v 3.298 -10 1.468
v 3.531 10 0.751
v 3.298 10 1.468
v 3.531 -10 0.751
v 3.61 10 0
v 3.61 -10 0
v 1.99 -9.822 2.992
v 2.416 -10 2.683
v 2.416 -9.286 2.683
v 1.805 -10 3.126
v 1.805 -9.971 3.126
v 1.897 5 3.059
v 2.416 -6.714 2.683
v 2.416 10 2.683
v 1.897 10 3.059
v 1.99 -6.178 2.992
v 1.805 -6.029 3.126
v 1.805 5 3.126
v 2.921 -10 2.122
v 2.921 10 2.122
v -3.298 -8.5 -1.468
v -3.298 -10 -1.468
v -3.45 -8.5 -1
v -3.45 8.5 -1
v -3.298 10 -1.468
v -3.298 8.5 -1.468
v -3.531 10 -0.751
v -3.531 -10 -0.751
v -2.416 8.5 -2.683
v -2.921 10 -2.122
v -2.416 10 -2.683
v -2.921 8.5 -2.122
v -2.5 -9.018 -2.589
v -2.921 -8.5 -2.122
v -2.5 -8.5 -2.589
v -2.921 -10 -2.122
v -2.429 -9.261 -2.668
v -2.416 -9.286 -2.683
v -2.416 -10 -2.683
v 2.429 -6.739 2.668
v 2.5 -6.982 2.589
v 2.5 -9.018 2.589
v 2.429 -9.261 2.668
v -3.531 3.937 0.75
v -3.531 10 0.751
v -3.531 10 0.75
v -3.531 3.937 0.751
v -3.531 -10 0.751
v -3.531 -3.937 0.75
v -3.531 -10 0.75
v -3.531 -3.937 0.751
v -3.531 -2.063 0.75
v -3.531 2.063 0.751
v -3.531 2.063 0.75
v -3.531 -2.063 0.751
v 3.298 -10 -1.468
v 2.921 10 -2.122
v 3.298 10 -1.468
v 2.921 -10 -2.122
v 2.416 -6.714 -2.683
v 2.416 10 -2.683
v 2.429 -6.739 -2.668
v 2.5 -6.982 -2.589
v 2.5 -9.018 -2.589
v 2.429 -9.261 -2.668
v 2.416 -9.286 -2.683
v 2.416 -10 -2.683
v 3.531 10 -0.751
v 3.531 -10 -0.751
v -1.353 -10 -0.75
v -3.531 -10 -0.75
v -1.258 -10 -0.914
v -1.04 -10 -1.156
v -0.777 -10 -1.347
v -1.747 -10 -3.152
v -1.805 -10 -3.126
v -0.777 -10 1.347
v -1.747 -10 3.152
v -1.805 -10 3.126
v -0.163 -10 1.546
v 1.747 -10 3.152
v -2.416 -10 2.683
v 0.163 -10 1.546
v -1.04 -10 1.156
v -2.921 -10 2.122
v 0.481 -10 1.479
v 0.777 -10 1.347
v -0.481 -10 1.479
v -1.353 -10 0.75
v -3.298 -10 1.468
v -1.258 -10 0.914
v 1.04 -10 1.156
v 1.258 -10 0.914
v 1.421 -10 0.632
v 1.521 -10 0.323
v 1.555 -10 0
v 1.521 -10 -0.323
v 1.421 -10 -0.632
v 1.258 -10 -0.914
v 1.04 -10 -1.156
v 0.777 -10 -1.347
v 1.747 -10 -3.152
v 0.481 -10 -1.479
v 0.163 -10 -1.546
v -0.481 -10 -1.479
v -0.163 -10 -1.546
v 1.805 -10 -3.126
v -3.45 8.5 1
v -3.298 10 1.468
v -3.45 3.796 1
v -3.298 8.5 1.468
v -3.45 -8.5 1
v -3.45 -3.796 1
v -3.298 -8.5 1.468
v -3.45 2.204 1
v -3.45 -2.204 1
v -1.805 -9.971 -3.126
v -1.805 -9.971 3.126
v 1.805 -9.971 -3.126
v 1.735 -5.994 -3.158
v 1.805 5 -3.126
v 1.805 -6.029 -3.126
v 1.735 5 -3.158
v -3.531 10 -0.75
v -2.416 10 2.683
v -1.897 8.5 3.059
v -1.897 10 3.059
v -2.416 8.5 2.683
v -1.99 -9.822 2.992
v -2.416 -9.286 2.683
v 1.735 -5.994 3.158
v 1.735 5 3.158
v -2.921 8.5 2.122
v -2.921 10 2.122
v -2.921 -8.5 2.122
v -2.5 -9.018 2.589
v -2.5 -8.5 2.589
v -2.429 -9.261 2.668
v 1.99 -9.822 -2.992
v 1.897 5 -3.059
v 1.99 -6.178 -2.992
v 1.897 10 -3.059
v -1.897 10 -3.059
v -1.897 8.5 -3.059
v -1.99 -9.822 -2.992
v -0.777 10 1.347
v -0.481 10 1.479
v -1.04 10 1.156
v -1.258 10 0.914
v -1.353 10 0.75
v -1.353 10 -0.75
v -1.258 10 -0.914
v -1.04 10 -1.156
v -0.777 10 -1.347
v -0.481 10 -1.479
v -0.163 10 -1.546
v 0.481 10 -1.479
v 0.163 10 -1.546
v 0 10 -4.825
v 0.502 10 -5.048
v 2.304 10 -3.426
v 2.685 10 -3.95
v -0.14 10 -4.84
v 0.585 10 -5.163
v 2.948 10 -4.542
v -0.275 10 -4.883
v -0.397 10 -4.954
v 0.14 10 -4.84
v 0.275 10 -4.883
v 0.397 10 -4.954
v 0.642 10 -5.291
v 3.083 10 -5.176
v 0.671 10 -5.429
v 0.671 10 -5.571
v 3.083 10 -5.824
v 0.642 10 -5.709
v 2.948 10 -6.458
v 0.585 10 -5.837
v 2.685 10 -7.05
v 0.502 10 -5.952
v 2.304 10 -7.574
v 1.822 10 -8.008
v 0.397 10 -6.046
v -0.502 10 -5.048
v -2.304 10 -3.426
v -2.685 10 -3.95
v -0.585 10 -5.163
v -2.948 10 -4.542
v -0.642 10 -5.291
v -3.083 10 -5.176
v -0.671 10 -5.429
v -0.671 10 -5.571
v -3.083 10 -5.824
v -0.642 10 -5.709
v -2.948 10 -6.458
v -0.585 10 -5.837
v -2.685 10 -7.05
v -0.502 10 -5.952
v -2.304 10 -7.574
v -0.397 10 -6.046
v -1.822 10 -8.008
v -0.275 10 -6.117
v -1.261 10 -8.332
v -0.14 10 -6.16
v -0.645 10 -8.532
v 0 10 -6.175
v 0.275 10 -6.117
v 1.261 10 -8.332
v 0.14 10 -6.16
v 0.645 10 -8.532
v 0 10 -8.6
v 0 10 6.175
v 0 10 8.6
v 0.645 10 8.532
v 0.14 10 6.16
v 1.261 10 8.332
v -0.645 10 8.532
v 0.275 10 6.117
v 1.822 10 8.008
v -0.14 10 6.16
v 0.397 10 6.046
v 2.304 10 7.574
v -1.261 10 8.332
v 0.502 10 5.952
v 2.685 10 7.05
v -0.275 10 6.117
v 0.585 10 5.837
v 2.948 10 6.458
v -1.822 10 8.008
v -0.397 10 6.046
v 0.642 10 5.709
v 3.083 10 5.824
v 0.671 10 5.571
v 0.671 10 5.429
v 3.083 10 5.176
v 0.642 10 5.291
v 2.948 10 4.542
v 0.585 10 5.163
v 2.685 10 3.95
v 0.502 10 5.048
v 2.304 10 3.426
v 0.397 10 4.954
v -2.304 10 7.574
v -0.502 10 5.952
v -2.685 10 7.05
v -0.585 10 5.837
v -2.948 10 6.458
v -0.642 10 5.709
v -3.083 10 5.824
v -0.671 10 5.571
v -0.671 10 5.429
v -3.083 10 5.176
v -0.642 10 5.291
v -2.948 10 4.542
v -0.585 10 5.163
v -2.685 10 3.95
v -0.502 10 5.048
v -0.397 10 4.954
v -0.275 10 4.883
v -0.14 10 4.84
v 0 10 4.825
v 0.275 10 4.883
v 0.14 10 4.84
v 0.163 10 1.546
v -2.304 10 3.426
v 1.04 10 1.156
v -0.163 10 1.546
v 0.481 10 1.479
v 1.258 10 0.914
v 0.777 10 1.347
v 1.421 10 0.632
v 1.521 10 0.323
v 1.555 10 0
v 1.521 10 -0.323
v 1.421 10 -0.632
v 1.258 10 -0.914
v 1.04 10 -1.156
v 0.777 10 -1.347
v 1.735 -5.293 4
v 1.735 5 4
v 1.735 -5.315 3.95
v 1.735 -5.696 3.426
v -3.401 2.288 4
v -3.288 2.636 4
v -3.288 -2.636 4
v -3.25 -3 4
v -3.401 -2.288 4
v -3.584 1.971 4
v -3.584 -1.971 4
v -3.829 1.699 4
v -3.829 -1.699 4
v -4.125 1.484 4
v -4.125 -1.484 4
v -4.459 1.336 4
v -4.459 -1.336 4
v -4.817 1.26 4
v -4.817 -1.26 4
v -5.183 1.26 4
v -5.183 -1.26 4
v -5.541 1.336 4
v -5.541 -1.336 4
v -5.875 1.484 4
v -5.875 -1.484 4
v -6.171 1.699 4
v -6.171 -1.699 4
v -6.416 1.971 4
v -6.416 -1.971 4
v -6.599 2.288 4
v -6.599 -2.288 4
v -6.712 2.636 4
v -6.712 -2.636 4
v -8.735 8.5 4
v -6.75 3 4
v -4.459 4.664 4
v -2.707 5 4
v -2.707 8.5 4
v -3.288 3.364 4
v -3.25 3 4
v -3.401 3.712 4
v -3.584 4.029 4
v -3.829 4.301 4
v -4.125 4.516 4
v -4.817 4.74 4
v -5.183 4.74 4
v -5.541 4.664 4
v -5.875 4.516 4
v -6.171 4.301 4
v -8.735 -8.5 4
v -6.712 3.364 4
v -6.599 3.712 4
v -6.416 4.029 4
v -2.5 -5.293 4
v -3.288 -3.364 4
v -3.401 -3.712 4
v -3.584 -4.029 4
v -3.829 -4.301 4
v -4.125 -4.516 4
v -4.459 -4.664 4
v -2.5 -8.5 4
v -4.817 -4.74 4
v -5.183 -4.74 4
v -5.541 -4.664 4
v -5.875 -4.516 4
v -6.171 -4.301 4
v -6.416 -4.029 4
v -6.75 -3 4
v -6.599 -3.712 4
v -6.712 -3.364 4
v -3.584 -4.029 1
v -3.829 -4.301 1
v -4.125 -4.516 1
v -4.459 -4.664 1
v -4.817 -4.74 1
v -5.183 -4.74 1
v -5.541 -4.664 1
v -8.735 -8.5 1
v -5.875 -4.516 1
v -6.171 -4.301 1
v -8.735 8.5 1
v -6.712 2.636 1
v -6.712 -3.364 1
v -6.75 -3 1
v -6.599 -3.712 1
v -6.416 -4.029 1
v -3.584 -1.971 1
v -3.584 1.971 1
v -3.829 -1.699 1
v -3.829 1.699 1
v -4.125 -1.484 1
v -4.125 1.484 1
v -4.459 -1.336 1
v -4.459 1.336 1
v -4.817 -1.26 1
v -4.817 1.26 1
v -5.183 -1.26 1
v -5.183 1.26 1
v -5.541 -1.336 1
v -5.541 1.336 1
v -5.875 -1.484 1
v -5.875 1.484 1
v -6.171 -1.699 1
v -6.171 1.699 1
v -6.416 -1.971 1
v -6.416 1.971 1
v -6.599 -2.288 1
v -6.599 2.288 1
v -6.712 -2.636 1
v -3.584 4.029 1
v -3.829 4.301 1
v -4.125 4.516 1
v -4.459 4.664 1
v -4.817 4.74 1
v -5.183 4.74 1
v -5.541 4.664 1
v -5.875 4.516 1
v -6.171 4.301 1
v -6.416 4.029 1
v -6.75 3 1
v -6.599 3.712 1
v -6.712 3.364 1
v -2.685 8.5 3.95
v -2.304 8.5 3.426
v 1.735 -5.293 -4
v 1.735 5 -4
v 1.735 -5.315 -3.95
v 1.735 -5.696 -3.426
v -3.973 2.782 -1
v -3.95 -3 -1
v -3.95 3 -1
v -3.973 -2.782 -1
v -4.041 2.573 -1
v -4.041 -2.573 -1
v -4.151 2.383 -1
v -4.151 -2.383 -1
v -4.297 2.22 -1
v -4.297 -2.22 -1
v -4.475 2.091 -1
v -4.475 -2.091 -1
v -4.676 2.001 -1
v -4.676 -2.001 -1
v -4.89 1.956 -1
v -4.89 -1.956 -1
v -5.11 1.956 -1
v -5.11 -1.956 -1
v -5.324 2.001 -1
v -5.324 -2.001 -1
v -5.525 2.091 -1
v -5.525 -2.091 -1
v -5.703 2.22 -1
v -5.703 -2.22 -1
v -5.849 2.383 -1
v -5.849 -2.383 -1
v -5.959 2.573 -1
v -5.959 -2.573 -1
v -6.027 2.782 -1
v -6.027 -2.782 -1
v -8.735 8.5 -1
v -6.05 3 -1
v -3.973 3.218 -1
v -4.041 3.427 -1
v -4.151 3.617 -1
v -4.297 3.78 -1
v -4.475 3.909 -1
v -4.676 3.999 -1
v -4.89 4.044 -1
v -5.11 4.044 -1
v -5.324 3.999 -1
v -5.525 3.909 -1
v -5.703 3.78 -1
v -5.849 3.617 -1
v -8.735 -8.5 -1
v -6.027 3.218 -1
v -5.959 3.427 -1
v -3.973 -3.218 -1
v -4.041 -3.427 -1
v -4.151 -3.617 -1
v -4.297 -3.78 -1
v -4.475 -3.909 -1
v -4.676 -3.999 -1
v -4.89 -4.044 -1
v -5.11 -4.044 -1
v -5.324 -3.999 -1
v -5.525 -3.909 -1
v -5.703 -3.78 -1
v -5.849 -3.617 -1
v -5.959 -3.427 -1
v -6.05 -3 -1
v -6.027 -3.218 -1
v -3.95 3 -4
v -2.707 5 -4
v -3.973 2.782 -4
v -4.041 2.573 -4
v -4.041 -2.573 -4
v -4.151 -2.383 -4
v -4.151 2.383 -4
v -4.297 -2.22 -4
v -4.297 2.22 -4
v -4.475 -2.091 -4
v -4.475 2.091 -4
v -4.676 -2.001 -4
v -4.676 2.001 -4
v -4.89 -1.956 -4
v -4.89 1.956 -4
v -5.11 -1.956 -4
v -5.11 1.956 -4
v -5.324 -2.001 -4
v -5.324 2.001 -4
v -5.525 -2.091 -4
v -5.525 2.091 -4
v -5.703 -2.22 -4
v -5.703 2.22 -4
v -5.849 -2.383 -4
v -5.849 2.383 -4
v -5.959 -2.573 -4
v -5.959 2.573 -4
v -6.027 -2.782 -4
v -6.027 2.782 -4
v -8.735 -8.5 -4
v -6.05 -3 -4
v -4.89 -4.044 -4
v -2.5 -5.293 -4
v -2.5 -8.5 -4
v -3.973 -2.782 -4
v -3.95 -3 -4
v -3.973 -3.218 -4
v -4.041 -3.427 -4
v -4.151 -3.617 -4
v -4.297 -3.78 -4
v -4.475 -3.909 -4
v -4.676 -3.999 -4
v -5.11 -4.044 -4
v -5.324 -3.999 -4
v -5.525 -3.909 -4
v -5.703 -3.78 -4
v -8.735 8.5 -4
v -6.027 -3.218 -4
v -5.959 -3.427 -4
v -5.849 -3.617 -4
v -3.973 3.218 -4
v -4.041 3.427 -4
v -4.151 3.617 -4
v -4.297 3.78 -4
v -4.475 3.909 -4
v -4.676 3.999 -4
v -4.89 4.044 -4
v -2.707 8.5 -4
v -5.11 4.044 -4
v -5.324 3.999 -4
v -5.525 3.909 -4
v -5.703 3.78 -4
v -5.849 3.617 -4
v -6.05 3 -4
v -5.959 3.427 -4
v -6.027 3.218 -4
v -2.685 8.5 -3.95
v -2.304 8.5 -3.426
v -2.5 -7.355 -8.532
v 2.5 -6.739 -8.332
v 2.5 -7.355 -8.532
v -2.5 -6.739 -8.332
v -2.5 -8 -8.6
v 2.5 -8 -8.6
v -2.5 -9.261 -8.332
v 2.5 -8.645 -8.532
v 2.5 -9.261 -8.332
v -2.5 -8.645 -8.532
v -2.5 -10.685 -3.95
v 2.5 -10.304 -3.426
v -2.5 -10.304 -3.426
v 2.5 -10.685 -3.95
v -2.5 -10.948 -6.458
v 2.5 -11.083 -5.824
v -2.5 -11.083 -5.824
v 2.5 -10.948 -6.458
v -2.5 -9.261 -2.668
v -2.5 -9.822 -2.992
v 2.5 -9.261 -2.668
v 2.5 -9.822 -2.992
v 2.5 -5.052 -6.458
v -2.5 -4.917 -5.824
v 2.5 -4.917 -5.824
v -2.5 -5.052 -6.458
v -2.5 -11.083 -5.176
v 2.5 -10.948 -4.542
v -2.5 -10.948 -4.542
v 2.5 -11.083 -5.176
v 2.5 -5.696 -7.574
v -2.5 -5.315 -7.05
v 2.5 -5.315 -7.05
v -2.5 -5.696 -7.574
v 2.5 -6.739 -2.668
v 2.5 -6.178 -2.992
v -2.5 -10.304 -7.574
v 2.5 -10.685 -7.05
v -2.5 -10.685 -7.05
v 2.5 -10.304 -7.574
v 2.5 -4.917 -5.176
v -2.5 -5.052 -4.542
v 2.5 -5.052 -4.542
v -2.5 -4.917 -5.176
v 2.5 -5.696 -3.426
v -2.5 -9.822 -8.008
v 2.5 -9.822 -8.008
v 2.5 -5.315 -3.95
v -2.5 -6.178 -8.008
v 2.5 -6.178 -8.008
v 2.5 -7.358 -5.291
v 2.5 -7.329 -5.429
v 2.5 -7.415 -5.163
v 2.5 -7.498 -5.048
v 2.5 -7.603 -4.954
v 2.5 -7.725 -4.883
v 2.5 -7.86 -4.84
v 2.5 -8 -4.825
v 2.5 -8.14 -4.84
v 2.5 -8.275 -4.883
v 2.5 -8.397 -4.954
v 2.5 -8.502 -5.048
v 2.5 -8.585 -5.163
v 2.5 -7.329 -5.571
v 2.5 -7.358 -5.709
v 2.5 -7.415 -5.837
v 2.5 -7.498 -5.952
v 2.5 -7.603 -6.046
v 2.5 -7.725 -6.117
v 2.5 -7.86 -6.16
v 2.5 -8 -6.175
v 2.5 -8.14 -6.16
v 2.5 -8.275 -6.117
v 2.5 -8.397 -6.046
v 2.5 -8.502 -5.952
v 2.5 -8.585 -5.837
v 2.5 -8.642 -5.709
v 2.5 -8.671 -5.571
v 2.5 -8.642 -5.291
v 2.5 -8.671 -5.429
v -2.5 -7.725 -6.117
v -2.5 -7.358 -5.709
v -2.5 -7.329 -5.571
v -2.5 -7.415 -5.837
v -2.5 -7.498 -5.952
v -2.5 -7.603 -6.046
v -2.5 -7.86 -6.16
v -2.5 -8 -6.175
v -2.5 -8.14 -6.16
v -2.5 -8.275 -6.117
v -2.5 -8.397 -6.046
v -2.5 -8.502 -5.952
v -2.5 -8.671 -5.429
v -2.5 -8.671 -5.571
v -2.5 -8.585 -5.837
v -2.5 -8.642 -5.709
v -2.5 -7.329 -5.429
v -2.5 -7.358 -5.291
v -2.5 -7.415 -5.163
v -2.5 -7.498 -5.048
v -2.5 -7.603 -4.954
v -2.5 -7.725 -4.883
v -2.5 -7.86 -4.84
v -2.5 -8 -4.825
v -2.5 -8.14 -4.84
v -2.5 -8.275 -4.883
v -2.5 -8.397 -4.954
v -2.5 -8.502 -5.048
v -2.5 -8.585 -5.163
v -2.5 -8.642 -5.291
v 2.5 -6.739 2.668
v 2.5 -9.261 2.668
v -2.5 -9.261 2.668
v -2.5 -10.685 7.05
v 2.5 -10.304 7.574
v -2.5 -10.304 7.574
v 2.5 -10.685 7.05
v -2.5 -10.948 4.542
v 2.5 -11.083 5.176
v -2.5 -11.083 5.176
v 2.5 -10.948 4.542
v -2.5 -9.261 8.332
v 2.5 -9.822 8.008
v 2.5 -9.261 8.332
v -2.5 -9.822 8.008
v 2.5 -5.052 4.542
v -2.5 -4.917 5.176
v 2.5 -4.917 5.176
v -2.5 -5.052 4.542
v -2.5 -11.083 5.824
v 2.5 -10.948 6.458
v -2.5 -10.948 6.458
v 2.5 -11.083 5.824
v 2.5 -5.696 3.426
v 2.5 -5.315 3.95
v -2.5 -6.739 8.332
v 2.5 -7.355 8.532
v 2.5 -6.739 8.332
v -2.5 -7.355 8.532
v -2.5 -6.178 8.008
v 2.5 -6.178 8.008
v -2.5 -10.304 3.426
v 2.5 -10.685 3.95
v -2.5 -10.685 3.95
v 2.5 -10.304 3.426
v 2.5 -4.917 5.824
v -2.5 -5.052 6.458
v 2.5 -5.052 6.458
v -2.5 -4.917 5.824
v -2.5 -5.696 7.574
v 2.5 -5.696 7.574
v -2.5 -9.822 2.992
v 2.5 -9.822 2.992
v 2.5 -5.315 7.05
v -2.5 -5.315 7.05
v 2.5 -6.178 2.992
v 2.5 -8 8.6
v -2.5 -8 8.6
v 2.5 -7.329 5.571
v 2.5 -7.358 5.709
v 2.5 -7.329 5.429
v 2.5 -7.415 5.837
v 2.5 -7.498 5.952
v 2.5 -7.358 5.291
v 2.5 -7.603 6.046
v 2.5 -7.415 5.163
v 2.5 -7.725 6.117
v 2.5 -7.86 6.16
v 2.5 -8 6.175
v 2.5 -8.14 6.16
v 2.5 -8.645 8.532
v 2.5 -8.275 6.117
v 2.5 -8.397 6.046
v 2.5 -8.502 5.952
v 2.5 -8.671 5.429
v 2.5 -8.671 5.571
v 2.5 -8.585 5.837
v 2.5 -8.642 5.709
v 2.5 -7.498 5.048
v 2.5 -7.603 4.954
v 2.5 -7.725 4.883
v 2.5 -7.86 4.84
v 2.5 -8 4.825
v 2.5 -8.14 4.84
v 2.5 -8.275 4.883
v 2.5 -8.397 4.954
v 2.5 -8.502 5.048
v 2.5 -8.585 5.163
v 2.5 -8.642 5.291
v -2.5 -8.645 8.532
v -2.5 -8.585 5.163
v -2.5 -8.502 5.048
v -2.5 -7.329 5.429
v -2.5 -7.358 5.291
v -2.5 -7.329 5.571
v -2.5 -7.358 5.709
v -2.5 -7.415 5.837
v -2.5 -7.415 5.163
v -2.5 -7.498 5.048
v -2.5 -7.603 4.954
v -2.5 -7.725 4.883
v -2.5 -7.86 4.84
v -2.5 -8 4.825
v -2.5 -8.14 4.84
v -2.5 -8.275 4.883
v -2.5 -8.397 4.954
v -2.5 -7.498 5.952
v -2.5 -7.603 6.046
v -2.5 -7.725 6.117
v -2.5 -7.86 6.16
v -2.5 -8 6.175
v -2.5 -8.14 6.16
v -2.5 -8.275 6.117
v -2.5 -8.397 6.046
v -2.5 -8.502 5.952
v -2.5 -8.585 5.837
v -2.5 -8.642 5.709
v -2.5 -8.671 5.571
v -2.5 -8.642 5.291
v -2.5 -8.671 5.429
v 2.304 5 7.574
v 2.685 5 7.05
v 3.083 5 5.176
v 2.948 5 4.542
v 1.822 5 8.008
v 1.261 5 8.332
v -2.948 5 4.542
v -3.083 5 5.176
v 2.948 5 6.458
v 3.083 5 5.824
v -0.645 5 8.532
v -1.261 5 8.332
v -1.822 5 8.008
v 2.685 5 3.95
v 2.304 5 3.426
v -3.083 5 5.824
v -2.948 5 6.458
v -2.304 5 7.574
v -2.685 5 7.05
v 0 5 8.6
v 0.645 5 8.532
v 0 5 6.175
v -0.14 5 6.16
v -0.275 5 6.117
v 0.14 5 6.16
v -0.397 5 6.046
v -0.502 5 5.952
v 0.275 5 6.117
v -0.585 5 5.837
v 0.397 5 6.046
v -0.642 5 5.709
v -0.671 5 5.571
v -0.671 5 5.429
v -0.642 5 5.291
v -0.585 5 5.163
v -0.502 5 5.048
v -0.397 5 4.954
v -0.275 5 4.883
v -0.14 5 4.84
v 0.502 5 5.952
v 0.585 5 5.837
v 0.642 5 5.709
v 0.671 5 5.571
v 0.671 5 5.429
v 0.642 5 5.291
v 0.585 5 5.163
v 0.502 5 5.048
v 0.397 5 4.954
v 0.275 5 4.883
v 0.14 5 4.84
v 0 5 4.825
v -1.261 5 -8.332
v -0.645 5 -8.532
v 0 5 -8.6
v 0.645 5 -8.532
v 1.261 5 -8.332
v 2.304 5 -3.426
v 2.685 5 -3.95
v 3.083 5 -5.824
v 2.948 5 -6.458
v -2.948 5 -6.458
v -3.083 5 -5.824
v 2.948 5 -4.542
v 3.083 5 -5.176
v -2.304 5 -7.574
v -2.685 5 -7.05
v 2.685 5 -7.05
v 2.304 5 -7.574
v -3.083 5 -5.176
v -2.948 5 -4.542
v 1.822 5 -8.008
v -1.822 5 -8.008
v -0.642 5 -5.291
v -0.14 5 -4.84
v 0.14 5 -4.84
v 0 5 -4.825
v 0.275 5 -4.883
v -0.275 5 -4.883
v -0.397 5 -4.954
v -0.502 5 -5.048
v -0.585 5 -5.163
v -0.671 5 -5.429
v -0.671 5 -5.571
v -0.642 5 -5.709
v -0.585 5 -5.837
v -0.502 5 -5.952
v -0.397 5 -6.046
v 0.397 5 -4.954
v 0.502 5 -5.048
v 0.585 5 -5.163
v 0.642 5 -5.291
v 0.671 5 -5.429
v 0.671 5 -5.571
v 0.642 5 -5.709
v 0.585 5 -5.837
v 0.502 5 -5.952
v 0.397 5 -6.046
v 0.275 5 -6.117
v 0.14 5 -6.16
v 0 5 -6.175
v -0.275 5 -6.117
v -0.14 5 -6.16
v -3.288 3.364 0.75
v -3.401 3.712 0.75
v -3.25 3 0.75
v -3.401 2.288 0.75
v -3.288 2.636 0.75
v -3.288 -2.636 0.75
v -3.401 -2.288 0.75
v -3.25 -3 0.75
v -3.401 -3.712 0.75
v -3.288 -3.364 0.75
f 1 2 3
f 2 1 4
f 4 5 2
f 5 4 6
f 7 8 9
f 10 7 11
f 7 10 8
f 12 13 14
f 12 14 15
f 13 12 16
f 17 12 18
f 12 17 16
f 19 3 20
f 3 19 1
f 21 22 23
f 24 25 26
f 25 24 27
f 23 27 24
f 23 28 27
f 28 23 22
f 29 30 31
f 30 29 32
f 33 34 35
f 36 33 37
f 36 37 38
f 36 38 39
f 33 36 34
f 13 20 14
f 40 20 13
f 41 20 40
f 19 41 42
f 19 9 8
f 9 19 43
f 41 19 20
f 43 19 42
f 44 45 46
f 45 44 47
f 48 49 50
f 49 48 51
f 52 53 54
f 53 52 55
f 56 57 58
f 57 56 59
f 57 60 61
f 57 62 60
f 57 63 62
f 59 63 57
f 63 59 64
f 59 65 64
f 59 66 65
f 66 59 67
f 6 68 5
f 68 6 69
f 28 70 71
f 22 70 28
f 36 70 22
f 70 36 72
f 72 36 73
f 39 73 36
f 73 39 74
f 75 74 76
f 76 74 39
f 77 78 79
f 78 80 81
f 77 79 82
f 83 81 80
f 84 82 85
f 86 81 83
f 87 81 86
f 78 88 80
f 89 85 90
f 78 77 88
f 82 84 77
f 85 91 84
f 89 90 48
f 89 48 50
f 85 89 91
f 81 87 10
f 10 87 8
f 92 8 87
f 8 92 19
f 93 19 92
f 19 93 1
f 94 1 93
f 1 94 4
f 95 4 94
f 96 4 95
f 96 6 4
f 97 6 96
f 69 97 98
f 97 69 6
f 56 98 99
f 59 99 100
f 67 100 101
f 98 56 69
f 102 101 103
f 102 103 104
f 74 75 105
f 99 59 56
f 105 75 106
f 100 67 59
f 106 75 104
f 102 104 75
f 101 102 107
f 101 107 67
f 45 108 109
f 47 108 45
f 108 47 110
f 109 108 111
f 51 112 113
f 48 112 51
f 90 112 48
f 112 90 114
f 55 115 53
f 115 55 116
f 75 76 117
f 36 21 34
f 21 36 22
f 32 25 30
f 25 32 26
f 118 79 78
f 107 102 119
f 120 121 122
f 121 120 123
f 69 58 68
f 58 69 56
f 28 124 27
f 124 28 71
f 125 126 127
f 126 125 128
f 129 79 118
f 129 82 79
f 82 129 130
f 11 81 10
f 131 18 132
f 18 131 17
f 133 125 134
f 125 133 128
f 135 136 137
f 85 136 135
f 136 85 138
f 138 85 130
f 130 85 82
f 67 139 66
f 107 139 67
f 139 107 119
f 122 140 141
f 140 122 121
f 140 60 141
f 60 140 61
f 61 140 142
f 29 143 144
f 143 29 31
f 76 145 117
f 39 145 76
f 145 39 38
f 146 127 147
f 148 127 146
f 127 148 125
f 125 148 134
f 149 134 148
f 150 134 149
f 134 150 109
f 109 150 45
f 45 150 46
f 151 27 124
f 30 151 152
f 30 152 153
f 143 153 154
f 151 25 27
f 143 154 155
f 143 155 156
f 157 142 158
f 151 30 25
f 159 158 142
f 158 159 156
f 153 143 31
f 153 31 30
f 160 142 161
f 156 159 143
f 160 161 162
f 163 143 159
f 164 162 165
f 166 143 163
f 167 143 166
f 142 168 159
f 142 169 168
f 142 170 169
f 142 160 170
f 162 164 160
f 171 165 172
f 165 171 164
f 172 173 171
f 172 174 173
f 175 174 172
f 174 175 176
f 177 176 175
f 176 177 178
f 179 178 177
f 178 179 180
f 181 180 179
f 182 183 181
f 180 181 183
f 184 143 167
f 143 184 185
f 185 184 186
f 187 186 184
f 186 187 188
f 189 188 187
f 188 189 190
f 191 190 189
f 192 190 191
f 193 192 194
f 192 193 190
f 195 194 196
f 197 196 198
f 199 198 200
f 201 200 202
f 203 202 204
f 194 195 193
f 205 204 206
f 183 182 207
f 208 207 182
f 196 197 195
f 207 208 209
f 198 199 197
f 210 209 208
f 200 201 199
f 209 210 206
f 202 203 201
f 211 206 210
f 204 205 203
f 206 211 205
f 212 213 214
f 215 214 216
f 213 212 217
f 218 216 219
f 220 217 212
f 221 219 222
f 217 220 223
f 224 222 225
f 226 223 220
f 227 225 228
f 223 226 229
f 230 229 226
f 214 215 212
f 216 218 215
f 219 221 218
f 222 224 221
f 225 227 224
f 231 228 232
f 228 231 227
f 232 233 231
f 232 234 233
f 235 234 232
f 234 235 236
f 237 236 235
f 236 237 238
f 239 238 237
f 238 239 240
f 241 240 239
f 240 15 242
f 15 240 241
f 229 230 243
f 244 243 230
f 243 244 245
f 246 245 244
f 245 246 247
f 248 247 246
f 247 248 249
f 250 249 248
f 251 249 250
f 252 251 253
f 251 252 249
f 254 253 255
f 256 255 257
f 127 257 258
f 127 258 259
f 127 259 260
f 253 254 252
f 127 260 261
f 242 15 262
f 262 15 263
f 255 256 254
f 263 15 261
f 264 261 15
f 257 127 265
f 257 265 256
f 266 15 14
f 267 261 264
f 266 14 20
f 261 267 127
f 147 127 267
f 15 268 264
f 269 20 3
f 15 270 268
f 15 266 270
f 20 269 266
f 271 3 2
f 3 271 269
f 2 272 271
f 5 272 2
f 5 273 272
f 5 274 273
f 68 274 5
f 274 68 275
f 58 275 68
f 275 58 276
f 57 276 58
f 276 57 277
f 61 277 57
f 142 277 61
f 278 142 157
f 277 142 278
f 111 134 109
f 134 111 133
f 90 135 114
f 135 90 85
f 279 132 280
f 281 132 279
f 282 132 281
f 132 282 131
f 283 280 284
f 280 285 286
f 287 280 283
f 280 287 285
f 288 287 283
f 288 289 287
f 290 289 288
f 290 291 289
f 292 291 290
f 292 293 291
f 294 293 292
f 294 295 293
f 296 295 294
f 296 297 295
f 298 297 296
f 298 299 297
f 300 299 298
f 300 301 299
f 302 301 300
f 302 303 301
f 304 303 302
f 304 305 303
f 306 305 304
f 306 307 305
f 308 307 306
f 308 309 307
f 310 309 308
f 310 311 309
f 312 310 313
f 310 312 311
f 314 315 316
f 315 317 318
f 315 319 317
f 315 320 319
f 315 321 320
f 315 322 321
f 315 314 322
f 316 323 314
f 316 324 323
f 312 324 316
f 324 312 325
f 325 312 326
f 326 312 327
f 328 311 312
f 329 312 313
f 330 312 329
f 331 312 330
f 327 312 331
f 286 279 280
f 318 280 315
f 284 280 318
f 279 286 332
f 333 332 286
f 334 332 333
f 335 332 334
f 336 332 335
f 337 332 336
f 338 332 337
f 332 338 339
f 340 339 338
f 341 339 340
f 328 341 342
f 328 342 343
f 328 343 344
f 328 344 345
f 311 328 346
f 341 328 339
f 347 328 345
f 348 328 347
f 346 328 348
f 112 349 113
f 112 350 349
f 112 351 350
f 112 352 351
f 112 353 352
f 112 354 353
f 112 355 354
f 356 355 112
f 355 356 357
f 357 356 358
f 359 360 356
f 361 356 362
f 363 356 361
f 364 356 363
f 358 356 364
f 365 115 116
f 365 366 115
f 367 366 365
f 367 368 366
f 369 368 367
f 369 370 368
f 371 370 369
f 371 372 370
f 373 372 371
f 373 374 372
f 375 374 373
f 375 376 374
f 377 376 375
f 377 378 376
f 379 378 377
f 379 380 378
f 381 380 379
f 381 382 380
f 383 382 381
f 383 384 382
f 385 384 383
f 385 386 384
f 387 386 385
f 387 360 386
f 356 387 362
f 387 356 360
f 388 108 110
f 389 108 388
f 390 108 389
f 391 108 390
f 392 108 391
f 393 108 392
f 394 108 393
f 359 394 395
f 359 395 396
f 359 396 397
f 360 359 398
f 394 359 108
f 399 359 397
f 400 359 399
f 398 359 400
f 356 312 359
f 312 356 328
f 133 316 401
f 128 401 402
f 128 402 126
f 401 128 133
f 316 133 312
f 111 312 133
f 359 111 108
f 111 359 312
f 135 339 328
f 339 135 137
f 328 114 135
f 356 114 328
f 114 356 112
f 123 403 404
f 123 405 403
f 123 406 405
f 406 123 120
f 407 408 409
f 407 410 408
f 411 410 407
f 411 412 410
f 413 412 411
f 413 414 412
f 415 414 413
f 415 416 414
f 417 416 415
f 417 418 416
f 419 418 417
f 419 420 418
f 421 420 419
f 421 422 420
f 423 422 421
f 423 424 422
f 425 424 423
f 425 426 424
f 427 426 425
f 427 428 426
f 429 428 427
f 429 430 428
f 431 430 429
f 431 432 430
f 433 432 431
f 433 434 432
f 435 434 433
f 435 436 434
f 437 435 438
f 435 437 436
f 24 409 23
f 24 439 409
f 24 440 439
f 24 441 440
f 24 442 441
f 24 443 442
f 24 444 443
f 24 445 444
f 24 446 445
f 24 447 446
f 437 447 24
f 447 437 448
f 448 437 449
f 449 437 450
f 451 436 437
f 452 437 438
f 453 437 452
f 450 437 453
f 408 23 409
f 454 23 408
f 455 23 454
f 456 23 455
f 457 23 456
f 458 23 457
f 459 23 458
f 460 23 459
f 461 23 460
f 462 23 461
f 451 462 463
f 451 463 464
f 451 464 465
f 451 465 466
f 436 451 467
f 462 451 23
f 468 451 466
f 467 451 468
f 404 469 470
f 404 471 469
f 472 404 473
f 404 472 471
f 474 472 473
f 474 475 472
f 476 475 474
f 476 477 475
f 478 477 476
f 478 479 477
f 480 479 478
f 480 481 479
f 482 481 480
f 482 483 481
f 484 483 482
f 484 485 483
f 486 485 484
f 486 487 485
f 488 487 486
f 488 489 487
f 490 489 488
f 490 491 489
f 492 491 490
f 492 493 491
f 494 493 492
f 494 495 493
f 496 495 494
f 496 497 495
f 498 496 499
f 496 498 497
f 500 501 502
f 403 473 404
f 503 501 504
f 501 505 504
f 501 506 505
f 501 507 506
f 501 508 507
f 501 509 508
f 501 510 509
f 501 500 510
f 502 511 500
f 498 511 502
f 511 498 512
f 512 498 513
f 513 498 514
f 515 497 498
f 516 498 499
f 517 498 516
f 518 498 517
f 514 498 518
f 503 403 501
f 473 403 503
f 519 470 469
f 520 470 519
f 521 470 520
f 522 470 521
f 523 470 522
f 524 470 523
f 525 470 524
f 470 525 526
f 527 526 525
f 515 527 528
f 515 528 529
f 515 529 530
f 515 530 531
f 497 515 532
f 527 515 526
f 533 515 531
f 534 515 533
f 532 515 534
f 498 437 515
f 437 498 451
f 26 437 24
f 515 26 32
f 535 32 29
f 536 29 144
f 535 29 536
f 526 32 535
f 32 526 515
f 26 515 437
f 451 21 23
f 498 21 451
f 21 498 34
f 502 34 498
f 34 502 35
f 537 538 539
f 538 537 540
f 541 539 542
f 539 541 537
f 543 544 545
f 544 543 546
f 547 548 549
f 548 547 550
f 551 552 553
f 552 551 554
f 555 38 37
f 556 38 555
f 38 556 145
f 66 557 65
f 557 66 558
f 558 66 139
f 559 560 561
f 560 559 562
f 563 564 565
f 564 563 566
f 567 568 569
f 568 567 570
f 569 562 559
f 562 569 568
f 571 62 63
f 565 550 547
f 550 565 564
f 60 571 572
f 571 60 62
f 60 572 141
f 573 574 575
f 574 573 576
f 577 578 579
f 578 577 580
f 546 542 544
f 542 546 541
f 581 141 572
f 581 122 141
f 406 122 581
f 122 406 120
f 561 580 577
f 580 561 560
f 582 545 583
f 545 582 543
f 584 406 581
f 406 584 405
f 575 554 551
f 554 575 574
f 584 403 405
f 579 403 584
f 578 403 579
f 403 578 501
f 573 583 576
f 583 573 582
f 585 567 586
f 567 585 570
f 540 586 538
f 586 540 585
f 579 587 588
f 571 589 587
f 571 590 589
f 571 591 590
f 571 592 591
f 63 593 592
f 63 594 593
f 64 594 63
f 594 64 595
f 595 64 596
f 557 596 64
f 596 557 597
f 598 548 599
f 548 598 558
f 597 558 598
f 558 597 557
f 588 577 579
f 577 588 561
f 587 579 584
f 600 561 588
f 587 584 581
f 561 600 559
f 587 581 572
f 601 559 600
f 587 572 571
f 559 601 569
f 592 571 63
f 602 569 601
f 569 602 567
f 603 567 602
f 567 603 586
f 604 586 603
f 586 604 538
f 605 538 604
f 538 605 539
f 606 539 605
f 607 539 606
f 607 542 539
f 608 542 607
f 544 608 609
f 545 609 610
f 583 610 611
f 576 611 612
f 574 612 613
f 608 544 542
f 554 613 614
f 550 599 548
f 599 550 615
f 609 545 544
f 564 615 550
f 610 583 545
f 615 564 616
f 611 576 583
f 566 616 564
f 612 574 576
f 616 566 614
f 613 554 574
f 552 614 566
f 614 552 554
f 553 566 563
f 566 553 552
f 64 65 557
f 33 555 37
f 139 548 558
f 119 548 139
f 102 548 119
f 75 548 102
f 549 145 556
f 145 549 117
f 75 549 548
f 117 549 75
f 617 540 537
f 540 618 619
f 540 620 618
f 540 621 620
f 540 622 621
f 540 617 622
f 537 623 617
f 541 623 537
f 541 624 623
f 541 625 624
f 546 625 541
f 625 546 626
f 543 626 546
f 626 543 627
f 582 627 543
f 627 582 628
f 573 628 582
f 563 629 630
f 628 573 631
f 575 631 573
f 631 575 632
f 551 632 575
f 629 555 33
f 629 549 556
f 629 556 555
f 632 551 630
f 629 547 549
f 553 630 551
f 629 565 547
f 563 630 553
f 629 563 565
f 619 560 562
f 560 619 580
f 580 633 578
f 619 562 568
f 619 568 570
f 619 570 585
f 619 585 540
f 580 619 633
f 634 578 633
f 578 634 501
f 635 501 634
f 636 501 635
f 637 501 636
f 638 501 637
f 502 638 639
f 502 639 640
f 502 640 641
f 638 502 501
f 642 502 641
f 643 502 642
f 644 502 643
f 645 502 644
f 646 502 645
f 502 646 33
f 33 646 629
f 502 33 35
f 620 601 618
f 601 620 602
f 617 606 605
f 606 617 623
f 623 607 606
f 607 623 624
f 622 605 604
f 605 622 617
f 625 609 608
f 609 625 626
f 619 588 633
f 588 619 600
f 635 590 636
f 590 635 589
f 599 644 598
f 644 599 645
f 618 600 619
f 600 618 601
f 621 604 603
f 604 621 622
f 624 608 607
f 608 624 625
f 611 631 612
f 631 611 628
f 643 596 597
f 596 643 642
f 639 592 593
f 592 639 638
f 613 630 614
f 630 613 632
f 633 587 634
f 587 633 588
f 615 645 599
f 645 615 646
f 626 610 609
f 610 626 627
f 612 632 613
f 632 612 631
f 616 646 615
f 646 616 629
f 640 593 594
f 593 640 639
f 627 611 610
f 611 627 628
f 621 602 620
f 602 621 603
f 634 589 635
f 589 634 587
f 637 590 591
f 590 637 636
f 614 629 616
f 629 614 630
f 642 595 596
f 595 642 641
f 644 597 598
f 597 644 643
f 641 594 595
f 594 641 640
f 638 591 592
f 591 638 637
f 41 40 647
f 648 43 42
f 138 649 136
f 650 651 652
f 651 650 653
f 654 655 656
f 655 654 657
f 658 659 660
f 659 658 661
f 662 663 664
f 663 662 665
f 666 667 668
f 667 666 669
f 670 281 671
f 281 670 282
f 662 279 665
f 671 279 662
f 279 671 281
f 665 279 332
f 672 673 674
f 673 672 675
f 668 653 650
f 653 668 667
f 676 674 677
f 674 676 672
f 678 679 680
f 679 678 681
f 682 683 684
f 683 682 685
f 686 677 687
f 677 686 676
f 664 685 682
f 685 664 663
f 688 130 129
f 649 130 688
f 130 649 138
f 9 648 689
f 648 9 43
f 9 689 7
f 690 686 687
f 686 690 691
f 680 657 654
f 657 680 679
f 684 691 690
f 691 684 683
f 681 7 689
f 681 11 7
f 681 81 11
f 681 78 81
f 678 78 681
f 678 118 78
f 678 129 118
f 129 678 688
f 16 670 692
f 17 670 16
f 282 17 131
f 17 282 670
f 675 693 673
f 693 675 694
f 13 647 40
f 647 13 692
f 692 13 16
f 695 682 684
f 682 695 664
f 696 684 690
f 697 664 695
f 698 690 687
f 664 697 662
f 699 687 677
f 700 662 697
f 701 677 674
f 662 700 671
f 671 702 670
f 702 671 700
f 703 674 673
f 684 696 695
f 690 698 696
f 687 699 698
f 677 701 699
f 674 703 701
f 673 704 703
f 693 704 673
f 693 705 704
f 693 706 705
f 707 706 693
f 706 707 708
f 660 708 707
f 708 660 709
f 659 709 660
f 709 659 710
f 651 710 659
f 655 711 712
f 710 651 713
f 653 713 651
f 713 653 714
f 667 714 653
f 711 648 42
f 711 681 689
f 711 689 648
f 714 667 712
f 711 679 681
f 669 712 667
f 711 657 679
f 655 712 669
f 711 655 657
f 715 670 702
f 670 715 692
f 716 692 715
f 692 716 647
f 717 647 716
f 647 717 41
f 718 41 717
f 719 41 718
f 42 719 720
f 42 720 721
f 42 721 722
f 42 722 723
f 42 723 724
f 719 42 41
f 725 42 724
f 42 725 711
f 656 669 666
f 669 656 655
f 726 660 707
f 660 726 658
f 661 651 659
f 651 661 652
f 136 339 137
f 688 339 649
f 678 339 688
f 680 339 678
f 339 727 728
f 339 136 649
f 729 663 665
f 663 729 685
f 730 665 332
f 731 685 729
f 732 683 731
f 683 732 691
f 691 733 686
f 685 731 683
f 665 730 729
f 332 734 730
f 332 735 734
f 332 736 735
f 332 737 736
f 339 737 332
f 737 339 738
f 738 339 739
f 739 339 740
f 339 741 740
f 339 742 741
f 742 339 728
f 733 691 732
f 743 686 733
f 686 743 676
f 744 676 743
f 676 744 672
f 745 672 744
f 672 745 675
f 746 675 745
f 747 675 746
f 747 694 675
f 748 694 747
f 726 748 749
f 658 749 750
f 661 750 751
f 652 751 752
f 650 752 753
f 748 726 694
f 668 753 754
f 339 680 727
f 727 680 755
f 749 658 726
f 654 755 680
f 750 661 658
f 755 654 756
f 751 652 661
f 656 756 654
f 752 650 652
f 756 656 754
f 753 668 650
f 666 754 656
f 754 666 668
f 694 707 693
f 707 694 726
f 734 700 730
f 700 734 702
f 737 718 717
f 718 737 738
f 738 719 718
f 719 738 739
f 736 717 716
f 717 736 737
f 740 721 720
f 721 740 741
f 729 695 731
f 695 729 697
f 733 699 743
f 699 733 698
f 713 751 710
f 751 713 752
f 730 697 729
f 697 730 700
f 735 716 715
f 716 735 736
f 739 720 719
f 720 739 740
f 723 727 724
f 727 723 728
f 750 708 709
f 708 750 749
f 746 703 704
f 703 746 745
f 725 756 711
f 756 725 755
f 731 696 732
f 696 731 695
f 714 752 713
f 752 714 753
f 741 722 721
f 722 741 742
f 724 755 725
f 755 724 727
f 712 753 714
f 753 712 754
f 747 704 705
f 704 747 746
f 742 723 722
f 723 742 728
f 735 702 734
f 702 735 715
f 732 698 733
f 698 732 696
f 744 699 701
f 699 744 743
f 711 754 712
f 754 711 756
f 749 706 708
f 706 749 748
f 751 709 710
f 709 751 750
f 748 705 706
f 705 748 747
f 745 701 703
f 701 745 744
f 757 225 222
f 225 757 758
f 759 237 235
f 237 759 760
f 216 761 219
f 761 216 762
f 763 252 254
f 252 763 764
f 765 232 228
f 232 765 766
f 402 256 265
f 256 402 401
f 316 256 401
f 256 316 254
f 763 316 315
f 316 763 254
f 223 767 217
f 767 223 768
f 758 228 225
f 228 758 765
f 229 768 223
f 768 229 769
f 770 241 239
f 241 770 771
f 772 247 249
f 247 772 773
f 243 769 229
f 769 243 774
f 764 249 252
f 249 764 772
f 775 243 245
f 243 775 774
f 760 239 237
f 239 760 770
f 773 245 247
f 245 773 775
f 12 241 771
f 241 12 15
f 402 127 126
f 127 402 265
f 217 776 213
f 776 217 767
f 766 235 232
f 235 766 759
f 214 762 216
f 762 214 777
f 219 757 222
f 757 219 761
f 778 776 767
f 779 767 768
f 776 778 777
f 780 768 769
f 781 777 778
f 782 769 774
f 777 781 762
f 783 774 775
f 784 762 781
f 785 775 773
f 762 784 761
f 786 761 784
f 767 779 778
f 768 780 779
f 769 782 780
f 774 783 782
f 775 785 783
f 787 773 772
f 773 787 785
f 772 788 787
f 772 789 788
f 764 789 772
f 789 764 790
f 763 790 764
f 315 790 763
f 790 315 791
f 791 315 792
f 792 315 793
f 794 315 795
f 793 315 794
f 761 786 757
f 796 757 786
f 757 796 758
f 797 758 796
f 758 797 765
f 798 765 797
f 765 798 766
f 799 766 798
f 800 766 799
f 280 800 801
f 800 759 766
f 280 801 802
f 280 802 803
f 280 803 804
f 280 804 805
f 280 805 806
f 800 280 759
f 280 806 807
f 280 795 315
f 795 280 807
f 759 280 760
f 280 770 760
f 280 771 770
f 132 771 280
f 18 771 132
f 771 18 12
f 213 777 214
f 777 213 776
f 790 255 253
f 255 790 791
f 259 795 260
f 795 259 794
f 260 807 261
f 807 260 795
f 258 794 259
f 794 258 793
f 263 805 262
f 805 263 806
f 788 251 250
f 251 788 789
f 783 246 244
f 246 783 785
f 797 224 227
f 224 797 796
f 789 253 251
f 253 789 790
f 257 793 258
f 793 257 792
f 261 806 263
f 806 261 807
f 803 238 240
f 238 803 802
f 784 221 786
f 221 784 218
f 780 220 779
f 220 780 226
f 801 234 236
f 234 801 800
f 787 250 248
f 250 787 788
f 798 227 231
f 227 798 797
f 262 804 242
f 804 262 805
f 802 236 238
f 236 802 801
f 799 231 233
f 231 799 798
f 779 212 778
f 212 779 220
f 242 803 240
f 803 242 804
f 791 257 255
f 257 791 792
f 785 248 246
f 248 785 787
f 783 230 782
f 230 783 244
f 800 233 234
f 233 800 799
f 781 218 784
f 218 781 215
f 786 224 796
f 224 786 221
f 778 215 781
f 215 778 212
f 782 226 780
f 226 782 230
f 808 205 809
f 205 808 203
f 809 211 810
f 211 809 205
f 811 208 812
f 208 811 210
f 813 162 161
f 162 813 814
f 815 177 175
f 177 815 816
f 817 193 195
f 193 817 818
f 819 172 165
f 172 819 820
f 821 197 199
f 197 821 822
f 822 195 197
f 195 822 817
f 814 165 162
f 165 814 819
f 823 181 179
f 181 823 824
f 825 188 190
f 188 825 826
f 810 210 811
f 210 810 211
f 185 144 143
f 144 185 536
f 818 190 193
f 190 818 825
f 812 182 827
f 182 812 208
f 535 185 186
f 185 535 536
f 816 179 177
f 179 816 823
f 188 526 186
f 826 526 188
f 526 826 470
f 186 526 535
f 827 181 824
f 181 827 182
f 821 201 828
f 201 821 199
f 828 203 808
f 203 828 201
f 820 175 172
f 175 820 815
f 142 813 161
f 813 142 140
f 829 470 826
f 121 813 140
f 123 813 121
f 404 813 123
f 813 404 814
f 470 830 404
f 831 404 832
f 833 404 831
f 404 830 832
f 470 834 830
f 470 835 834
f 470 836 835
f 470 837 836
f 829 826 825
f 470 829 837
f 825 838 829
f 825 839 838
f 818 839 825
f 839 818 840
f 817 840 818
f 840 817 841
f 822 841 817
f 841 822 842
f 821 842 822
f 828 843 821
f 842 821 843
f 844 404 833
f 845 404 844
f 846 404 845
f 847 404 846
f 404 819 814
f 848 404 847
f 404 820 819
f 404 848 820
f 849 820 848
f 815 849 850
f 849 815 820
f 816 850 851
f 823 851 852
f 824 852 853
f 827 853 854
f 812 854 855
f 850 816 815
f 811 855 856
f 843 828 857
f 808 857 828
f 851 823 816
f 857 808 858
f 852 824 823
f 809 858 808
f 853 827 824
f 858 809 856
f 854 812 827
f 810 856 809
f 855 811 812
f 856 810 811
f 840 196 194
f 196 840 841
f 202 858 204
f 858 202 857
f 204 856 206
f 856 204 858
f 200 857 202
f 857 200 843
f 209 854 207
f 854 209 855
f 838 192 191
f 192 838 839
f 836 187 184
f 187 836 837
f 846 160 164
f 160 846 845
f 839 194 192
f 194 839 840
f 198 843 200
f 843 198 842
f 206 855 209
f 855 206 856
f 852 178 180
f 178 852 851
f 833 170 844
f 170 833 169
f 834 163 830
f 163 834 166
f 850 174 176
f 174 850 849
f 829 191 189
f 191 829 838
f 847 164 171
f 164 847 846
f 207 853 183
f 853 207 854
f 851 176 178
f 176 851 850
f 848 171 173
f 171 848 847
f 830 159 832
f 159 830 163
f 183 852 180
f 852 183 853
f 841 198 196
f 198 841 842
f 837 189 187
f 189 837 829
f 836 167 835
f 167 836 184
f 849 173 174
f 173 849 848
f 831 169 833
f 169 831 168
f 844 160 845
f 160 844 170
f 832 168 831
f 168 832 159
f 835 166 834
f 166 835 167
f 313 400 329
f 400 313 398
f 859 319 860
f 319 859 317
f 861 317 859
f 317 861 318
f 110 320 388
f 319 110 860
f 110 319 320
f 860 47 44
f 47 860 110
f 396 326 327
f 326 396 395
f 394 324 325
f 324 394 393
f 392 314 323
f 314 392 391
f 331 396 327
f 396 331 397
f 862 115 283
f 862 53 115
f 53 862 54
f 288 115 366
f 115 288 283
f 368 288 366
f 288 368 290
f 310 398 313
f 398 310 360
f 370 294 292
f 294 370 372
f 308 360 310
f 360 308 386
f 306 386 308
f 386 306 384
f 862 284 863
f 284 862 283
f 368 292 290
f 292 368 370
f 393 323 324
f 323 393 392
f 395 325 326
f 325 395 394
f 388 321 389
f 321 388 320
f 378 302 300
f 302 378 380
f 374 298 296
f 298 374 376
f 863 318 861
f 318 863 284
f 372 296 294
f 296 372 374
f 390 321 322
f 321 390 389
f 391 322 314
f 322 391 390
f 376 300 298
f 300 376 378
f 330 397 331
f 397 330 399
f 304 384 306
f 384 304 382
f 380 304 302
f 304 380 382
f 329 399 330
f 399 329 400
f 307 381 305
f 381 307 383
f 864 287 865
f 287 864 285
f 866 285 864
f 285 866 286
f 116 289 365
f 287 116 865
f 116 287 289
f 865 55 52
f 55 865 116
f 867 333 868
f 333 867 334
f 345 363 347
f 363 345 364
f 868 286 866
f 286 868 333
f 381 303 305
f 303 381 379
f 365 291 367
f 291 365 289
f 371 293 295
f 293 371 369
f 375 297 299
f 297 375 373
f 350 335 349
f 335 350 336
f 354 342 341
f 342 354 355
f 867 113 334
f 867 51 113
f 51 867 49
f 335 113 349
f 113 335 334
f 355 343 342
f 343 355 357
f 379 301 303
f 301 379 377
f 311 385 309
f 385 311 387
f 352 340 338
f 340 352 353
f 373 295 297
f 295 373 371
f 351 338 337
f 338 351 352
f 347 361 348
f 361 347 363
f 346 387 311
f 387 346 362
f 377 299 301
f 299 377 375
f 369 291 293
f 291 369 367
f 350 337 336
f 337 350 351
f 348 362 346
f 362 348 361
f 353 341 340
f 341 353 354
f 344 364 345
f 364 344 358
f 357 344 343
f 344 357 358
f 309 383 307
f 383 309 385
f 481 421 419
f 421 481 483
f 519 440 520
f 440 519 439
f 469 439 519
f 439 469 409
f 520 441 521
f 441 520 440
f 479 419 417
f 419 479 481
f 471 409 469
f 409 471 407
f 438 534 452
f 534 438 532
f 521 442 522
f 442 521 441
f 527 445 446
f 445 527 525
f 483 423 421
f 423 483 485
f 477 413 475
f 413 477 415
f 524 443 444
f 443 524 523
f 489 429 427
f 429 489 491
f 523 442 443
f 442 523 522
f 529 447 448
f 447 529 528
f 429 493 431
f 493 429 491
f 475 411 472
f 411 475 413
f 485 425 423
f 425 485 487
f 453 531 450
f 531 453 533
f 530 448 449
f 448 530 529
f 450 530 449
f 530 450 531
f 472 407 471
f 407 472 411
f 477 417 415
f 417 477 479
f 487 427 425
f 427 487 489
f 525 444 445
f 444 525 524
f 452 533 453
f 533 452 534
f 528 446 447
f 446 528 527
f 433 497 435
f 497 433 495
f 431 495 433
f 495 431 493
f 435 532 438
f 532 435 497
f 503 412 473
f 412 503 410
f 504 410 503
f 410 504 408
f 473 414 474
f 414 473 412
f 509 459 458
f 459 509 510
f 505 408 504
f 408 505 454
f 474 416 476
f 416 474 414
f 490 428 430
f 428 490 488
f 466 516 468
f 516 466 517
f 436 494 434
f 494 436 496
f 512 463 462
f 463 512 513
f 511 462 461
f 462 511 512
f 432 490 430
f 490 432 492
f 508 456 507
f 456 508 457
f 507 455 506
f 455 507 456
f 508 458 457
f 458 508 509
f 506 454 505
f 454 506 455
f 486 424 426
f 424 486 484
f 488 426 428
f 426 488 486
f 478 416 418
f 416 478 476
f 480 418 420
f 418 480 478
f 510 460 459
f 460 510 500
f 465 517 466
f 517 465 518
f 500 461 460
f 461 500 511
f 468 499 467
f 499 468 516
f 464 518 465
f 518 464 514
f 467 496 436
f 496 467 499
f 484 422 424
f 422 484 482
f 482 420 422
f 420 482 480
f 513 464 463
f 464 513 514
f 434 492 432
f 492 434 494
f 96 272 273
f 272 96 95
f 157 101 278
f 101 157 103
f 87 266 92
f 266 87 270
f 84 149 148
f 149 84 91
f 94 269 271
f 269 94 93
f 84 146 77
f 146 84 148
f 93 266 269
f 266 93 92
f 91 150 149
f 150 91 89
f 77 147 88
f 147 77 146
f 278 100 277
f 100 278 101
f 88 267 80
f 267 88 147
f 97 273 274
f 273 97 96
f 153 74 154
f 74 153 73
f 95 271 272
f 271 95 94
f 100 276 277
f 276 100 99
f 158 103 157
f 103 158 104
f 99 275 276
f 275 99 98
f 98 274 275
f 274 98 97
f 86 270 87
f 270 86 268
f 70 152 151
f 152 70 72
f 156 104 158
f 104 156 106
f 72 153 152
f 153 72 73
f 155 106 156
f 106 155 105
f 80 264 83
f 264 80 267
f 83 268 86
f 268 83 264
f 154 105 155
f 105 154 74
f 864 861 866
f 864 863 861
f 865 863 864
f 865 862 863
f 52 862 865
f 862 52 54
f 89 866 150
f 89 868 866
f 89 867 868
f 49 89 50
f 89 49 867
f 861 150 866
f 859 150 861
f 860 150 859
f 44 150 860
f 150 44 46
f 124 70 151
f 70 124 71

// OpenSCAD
SPINE=3.11;
BRAKE=1.35;
$fn=30;

module clamp() {
    rotate([90, 0])
        cylinder(d=SPINE*2+1, h=20, center=true);

    translate([-3.5, 0, 2.5])
        cube([SPINE*2+4.25, 17, 3], center=true);    
    translate([-3.5, 0, -2.5])
        cube([SPINE*2+4.25, 17, 3], center=true);
}

module clamp_holes() {
    translate([-5, 0]) {
        translate([0, 3]) 
            cylinder(d=3.5, h=5);

        translate([0, -3]) 
            cylinder(d=3.5, h=5);
    
        translate([0, 3]) 
            cylinder(d=2.1, h=20, center=true);

        translate([0, -3]) 
            cylinder(d=2.1, h=20, center=true);    
    }
}

module slot() {
    translate([-2, 0])
        cube([4, 30, 1.5], center=true);
}

module spine() {
    rotate([90, 0])
        cylinder(d=SPINE, h=50, center=true);
}


module brake_cable() {
    cylinder(d=BRAKE, h=50, center=true);
}

module ninety() {
    rotate([0, 90]) 
        difference() {
            cylinder(d=BRAKE*2+3.5, h=5, center=true);
            brake_cable();
        }
}

module parallel() {
    rotate([0 ,0, 90])
        ninety();
}

difference() {
    union() {
        clamp();
        translate([0, -8, -5.5]) 
            ninety();
        translate([0, -8, 5.5]) 
            ninety();
        
        translate([0, 7.5, 5.5])
            parallel();
        translate([0, 7.5, -5.5])
            parallel();
    }
    spine();
    slot();
    
    clamp_holes();
}
